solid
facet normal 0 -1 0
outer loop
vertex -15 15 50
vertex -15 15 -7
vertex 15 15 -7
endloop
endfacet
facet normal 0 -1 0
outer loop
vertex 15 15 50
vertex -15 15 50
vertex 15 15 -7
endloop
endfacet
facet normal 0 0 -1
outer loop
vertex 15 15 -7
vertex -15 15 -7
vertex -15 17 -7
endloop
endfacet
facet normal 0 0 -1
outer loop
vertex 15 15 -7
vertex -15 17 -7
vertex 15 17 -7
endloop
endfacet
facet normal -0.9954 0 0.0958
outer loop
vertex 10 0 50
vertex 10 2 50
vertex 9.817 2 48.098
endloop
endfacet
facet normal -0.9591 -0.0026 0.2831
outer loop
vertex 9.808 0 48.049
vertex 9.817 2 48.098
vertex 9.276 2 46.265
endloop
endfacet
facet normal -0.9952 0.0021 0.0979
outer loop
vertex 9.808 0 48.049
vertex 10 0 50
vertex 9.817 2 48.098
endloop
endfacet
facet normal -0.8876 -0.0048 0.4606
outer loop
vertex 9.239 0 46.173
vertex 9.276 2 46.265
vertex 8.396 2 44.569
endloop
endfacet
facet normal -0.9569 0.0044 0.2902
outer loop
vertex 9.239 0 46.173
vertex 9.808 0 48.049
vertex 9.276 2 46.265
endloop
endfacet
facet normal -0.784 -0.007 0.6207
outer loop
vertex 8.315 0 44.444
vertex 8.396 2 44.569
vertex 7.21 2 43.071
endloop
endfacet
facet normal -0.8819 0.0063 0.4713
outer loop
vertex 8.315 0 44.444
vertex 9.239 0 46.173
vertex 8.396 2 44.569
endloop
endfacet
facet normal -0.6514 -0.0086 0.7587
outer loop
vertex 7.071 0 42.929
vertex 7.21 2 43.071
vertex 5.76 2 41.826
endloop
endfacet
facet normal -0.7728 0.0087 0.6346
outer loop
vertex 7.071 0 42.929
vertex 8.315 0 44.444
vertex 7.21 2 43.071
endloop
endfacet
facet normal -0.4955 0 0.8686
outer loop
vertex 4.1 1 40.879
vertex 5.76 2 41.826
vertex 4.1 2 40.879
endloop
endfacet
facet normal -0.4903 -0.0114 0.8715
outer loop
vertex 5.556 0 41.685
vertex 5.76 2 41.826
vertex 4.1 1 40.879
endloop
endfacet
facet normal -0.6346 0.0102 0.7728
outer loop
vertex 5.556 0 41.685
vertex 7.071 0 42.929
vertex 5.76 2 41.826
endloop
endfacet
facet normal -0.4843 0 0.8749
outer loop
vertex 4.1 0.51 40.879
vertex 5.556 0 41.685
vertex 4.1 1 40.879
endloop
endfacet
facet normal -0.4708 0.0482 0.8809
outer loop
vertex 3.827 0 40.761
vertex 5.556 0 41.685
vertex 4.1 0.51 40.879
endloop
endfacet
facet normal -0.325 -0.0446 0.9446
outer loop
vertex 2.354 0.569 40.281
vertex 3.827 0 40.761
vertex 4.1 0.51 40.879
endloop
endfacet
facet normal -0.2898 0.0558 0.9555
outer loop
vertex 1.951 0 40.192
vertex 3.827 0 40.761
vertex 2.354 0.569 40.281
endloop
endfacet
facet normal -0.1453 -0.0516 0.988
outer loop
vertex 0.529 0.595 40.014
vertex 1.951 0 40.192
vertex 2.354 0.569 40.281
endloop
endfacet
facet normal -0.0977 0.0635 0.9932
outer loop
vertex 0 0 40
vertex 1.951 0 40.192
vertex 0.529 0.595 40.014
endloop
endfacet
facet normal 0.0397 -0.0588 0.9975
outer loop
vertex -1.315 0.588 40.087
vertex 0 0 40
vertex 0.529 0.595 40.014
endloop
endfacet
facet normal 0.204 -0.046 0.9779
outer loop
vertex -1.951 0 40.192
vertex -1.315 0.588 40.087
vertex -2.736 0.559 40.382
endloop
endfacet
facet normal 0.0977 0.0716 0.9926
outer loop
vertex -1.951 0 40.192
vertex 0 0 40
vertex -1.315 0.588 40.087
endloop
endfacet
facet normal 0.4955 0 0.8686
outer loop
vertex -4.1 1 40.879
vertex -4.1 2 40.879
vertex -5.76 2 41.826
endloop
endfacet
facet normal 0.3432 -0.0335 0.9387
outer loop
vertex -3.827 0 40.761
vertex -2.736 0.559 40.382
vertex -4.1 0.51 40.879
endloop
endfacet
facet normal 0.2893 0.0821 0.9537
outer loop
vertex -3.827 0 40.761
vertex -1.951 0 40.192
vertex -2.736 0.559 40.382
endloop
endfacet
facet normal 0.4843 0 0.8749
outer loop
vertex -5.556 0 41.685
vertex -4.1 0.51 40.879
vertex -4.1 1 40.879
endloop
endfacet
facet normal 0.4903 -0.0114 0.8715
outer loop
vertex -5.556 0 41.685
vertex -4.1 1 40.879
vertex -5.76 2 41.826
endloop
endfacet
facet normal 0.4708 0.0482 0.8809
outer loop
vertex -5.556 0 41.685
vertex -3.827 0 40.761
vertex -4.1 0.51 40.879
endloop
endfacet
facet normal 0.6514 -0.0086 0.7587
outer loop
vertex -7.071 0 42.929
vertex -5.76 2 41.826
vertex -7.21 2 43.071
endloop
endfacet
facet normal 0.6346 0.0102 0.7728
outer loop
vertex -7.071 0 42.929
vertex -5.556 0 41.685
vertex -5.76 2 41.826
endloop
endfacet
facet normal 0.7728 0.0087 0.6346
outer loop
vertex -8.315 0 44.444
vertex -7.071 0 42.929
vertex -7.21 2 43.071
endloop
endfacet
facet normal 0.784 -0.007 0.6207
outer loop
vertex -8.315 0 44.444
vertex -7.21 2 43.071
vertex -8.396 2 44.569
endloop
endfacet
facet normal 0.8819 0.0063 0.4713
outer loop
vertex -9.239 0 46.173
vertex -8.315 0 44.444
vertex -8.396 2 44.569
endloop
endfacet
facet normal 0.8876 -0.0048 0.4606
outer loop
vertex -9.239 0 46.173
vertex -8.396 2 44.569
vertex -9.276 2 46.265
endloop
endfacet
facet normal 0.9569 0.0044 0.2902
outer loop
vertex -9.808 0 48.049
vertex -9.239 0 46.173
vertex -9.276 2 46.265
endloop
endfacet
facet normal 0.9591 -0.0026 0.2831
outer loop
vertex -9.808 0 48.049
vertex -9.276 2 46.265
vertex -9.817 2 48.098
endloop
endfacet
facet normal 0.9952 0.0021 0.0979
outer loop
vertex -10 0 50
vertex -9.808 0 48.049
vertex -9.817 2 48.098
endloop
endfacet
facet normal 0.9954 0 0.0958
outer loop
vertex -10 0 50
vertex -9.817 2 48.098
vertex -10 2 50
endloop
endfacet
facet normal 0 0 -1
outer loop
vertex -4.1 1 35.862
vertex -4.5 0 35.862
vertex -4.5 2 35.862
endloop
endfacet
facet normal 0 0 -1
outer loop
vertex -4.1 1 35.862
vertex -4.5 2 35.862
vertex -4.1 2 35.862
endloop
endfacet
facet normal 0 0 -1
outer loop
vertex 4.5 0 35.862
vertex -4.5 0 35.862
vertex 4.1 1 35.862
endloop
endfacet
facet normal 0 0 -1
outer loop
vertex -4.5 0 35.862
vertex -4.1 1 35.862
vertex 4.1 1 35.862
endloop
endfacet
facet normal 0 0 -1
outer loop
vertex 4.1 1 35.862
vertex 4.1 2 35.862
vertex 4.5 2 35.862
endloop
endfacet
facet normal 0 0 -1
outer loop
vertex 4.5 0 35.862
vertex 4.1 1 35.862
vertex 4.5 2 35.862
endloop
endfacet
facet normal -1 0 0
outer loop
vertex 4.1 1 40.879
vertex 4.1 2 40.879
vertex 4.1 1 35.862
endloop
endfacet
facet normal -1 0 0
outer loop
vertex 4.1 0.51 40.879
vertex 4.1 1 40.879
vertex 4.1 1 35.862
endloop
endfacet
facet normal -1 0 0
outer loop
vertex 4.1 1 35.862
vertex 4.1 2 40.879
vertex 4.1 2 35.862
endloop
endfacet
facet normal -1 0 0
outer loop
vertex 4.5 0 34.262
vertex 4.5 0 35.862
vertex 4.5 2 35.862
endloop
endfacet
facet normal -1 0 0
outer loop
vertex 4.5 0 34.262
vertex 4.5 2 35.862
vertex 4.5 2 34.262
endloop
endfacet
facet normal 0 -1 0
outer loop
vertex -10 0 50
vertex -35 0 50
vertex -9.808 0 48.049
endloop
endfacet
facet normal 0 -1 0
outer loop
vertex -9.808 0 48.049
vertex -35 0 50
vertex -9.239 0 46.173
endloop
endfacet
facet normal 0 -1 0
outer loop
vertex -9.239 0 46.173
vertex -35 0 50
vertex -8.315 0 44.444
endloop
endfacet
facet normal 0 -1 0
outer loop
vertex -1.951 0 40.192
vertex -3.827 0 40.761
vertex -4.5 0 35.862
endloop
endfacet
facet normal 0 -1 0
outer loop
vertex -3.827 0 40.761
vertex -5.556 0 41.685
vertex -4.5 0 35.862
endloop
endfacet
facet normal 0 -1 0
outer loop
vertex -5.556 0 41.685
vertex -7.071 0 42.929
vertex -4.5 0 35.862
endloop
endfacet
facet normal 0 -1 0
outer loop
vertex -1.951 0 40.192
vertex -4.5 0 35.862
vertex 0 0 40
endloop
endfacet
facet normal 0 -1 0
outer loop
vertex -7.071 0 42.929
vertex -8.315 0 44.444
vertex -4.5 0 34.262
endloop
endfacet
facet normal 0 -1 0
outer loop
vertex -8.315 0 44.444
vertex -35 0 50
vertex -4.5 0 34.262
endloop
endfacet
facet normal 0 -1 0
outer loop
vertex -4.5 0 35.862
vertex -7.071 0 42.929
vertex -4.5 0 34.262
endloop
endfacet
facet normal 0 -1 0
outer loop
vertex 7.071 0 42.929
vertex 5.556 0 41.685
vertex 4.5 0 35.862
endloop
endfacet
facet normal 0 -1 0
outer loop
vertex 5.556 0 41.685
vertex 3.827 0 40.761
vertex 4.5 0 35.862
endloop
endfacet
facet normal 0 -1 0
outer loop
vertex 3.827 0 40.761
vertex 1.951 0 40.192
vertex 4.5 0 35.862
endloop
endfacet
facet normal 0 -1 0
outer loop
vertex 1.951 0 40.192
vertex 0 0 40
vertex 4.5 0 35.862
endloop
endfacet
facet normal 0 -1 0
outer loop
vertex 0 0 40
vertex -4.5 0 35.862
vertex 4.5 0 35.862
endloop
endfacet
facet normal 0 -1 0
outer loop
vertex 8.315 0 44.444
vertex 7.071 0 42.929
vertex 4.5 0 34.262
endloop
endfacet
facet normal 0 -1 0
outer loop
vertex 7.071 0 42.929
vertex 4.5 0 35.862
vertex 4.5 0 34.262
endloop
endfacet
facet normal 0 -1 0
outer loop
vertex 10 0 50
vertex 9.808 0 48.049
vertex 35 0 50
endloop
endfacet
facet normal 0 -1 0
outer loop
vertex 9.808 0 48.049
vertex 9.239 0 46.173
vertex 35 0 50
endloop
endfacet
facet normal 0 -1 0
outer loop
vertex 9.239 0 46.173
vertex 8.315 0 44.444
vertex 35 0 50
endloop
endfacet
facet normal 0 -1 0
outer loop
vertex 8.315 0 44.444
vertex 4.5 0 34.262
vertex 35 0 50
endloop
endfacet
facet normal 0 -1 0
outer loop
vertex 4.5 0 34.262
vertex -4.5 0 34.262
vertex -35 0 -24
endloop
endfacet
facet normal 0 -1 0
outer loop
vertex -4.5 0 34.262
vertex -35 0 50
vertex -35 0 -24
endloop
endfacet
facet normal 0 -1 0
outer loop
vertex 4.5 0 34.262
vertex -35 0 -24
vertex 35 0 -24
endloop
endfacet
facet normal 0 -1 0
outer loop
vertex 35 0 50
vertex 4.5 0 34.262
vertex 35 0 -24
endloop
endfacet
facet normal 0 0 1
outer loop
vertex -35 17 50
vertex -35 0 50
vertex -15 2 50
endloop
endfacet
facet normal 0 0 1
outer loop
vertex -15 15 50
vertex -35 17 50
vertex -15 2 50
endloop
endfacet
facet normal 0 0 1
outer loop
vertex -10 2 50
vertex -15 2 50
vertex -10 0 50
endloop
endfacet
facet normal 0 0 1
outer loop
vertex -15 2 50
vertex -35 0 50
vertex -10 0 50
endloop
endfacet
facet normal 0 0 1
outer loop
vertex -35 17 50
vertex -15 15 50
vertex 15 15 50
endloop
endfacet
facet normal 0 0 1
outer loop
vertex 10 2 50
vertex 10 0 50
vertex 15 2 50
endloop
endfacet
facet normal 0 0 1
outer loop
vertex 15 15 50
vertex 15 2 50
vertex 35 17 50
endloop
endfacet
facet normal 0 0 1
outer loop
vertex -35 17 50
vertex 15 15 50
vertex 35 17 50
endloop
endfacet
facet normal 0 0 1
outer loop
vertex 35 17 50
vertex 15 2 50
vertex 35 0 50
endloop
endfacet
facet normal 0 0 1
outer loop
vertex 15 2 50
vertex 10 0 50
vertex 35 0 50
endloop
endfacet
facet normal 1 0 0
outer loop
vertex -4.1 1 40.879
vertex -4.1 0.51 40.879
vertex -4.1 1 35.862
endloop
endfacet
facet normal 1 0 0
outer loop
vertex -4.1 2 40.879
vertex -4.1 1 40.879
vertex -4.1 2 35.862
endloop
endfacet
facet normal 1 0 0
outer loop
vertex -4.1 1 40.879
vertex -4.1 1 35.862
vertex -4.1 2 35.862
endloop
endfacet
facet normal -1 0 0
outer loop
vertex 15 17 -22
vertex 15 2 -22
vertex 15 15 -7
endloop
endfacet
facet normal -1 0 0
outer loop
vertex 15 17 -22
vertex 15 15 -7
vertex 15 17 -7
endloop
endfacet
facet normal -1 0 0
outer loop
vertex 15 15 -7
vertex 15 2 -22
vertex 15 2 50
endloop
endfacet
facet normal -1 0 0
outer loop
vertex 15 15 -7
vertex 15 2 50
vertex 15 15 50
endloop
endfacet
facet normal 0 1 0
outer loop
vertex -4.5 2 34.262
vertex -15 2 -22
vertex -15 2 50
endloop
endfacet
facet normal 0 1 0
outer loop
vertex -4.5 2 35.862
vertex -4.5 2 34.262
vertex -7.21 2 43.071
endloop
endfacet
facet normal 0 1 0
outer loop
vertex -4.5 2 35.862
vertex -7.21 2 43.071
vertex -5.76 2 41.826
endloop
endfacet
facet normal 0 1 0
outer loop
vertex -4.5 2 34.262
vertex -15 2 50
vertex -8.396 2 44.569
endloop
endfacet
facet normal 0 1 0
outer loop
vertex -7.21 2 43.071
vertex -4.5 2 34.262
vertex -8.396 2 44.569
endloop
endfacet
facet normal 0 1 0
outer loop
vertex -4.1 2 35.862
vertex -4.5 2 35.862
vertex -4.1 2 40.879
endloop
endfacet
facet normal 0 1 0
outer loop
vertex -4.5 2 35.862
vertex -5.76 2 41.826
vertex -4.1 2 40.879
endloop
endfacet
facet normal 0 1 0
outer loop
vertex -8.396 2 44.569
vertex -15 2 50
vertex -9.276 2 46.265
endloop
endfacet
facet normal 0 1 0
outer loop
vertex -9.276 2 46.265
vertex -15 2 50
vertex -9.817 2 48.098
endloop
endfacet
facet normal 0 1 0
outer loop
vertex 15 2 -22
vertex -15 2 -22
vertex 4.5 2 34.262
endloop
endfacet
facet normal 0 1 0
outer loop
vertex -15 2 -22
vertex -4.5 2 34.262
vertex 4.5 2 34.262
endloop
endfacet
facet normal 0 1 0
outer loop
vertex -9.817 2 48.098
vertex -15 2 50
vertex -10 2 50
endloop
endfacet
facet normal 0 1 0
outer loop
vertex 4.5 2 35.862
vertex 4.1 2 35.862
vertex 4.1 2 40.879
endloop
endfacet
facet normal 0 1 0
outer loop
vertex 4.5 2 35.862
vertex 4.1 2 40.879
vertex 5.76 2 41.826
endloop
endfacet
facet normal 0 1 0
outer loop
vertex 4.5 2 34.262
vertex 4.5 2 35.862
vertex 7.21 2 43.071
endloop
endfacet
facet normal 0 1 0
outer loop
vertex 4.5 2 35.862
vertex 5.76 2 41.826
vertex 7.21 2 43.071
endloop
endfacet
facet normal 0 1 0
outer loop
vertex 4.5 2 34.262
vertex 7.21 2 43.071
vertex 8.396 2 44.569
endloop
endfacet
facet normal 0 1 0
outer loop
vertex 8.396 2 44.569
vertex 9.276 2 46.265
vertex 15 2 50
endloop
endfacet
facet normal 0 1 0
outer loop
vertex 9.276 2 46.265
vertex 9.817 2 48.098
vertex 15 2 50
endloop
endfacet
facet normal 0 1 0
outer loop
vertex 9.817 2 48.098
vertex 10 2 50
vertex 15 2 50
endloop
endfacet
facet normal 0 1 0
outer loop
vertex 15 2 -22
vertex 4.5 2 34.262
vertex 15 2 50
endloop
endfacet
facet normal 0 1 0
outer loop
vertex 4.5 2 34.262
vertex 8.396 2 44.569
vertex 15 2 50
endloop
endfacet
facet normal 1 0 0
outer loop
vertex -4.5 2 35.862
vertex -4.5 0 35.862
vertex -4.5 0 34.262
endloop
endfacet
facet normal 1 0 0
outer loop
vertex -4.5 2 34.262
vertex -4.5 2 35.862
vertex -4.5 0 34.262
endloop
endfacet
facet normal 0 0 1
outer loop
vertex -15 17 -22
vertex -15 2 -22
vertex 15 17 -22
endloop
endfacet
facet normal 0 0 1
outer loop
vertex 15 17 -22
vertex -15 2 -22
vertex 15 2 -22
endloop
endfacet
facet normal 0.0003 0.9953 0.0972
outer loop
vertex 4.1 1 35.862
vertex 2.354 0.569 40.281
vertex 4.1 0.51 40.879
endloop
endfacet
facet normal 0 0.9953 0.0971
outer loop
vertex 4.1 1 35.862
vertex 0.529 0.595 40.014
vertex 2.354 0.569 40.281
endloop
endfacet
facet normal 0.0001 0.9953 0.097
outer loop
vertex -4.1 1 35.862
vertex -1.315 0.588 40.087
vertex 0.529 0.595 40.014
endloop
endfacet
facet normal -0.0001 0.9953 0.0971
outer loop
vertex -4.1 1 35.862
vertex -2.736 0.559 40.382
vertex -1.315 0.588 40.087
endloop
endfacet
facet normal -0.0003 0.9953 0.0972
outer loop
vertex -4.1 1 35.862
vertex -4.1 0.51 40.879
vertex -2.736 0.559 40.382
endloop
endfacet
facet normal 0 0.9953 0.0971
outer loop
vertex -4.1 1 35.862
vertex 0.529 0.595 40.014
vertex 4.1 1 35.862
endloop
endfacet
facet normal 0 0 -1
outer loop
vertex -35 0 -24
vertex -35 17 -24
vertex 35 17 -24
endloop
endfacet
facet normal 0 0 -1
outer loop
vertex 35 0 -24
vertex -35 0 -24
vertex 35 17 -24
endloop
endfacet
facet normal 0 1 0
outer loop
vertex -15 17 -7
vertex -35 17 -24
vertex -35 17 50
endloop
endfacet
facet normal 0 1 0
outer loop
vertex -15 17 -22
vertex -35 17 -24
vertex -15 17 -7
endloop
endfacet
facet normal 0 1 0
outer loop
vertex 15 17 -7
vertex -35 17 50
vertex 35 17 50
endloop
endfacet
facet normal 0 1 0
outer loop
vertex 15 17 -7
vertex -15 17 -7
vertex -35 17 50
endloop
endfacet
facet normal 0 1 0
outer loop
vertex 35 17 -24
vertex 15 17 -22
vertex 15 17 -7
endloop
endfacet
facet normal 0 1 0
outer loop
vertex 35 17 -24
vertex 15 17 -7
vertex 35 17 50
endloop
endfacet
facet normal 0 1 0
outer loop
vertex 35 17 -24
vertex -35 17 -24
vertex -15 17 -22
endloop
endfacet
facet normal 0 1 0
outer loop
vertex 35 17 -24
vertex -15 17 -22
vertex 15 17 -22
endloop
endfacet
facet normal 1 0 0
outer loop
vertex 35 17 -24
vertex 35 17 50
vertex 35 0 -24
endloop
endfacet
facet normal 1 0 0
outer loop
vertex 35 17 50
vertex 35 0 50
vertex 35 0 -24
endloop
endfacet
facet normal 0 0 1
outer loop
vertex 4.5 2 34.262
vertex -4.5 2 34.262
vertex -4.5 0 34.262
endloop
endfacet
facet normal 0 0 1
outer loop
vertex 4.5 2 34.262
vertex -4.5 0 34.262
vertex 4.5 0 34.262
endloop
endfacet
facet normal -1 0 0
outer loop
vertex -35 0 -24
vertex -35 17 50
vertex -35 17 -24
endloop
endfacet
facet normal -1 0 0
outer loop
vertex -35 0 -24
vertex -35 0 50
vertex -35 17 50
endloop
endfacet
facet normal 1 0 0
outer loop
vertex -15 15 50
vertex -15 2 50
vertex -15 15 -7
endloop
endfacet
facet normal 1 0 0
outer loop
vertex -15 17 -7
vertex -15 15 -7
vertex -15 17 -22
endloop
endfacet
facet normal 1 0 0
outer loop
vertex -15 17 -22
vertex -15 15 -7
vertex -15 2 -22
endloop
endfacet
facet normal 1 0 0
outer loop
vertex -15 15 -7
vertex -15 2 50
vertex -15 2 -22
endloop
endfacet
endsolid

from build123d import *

# Parameters (mm, degrees)
CROQUIS1_W              = 70
CROQUIS1_H              = 100
SALIENTE_EXTRUIR1_DEPTH = 15
CROQUIS2_W              = 30
CROQUIS2_H              = 13
CORTAR_EXTRUIR1_DEPTH   = 72
CORTAR_EXTRUIR2_DEPTH   = 72
CROQUIS4_W              = 9
CROQUIS4_H              = 1.6
CORTAR_EXTRUIR3_DEPTH   = 2
CROQUIS6_W              = 8.2
CROQUIS6_H              = 2
CORTAR_EXTRUIR4_DEPTH   = 94.926889384
CORTAR_EXTRUIR5_DEPTH   = 8.2
CROQUIS8_W              = 70
CROQUIS8_H              = 57
SALIENTE_EXTRUIR3_DEPTH = 2
CROQUIS9_W              = 20
CROQUIS9_H              = 15
SALIENTE_EXTRUIR4_DEPTH = 2
CROQUIS10_W             = 70
CROQUIS10_H             = 22.450330877
SALIENTE_EXTRUIR5_DEPTH = 2
CROQUIS12_W             = 70
CROQUIS12_H             = 26
CORTAR_EXTRUIR6_DEPTH   = 64.356136246


with BuildPart() as part:
    # Croquis1 → Saliente-Extruir1 (new body)
    with BuildSketch(Plane(origin=(0, 0, 0), x_dir=(1, 0, 0), z_dir=(0, 1, 0))):
        Rectangle(CROQUIS1_W, CROQUIS1_H)
    extrude(amount=SALIENTE_EXTRUIR1_DEPTH)

    # Croquis2 → Cortar-Extruir1 (cut)
    with BuildSketch(Plane.XY.offset(50)):
        with Locations((0, 8.5)):
            Rectangle(CROQUIS2_W, CROQUIS2_H)
    extrude(amount=-CORTAR_EXTRUIR1_DEPTH, mode=Mode.SUBTRACT)

    # Croquis3 → Cortar-Extruir2 (cut)
    with BuildSketch(Plane.XZ):
        with BuildLine():
            Line((-10, 50), (10, 50))
            ThreePointArc((10, 50), (0, 40), (-10, 50))
        make_face()
    extrude(amount=-CORTAR_EXTRUIR2_DEPTH, mode=Mode.SUBTRACT)

    # Croquis4 → Cortar-Extruir3 (cut)
    with BuildSketch(Plane(origin=(0, 2, 0), x_dir=(1, 0, 0), z_dir=(0, 1, 0))):
        with Locations((0, -35.061869007)):
            Rectangle(CROQUIS4_W, CROQUIS4_H)
    extrude(amount=-CORTAR_EXTRUIR3_DEPTH, mode=Mode.SUBTRACT)

    # Croquis6 → Cortar-Extruir4 (cut, through all)
    with BuildSketch(Plane(origin=(0, 0, 35.861869007), x_dir=(-1, 0, 0), z_dir=(0, 0, -1))):
        with Locations((0, 2)):
            Rectangle(CROQUIS6_W, CROQUIS6_H)
    extrude(amount=-CORTAR_EXTRUIR4_DEPTH, mode=Mode.SUBTRACT)

    # Croquis7 → Cortar-Extruir5 (cut)
    with BuildSketch(Plane(origin=(-4.1, 0, 0), x_dir=(0, 0, -1), z_dir=(1, 0, 0))):
        Polygon((-40.879144777, 0.510423286), (-35.861869007, 1), (-40.879144777, 1), align=None)
    extrude(amount=CORTAR_EXTRUIR5_DEPTH, mode=Mode.SUBTRACT)

    # Croquis8 → Saliente-Extruir3 (add)
    with BuildSketch(Plane(origin=(0, 15, 0), x_dir=(1, 0, 0), z_dir=(0, 1, 0))):
        with Locations((0, -21.5)):
            Rectangle(CROQUIS8_W, CROQUIS8_H)
        Polygon((15, 22), (35, 22), (35, 27.549669123), (-35, 27.549669123), (-35, 22), align=None)
    extrude(amount=SALIENTE_EXTRUIR3_DEPTH)

    # Croquis9 → Saliente-Extruir4 (add)
    with BuildSketch(Plane(origin=(0, 15, 0), x_dir=(1, 0, 0), z_dir=(0, 1, 0))):
        with Locations((-25, 14.5)):
            Rectangle(CROQUIS9_W, CROQUIS9_H)
        with Locations((25, 14.5)):
            Rectangle(CROQUIS9_W, CROQUIS9_H)
    extrude(amount=SALIENTE_EXTRUIR4_DEPTH)

    # Croquis10 → Saliente-Extruir5 (add)
    with BuildSketch(Plane(origin=(0, 15, 0), x_dir=(1, 0, 0), z_dir=(0, 1, 0))):
        with Locations((0, 38.774834562)):
            Rectangle(CROQUIS10_W, CROQUIS10_H)
    extrude(amount=SALIENTE_EXTRUIR5_DEPTH)

    # Croquis12 → Cortar-Extruir6 (cut, through all)
    with BuildSketch(Plane(origin=(0, 17, 0), x_dir=(1, 0, 0), z_dir=(0, 1, 0))):
        with Locations((0, 37)):
            Rectangle(CROQUIS12_W, CROQUIS12_H)
    extrude(amount=-CORTAR_EXTRUIR6_DEPTH, mode=Mode.SUBTRACT)


solid = part.part
